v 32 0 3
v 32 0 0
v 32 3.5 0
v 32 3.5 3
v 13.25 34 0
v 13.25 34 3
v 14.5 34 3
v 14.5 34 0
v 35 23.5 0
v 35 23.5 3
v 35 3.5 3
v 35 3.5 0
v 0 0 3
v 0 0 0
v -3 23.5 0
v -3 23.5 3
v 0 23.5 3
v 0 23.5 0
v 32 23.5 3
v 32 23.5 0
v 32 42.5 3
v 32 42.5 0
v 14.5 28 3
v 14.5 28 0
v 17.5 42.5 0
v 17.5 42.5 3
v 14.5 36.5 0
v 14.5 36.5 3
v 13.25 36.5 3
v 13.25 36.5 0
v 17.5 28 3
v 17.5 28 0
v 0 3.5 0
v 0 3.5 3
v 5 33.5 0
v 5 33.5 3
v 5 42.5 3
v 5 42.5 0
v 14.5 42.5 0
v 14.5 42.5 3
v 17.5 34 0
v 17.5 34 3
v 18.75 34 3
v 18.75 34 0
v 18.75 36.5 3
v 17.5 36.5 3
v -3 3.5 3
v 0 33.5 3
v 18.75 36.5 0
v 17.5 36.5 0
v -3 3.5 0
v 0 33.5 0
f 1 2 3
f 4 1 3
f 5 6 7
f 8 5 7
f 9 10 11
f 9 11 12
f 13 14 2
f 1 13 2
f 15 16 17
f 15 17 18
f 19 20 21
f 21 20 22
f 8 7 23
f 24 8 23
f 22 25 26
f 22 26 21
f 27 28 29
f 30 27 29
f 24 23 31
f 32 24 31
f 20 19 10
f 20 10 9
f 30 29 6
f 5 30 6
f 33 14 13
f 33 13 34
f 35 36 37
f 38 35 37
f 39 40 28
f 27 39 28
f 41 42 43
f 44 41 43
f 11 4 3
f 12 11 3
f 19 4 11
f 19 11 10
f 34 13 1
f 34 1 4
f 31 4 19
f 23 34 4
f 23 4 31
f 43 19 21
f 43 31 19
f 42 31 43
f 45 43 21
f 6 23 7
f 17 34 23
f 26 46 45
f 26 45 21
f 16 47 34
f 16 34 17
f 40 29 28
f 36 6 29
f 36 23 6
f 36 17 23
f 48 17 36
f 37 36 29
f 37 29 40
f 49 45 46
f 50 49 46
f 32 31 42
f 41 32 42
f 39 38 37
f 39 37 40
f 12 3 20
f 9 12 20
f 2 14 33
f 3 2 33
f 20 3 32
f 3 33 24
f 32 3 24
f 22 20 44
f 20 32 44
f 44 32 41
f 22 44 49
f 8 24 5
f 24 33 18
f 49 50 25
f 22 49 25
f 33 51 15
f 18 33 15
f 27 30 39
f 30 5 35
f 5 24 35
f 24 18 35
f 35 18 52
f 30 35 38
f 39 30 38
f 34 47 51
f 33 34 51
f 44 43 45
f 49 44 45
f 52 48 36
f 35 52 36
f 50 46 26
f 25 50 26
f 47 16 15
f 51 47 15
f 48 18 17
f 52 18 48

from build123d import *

# Parameters (mm, degrees)
SKETCH_1_W           = 32
SKETCH_1_H           = 42.5
EXTRUDE_1_DEPTH      = 3
EXTRUDE_2_DEPTH      = 3
EXTRUDE_2_DEPTH_BACK = 35
SKETCH_2_W           = 3
SKETCH_2_H           = 20
CUT_EXTRUDE_1_DEPTH  = 3
SKETCH_4_W           = 5
SKETCH_4_H           = 9
CUT_EXTRUDE_2_DEPTH  = 3


with BuildPart() as part:
    # Sketch 1 → Extrude 1 (new body)
    with BuildSketch(Plane.XY):
        with Locations((16, 21.25)):
            Rectangle(SKETCH_1_W, SKETCH_1_H)
    extrude(amount=EXTRUDE_1_DEPTH)

    # Sketch 2 → Extrude 2 (add, two sides: drawn at the far end of the back side and taken through both)
    with BuildSketch(Plane(origin=(32, 0, 0), x_dir=(0, 0, -1), z_dir=(1, 0, 0)).offset(-EXTRUDE_2_DEPTH_BACK)):
        with Locations((-1.5, 13.5)):
            Rectangle(SKETCH_2_W, SKETCH_2_H)
    extrude(amount=EXTRUDE_2_DEPTH + EXTRUDE_2_DEPTH_BACK)

    # Sketch 3 → Cut-Extrude 1 (cut)
    with BuildSketch(Plane.XY.offset(3)):
        Polygon((14.5, 42.5), (14.5, 36.5), (13.25, 36.5), (13.25, 34), (14.5, 34), (14.5, 28), (17.5, 28), (17.5, 34), (18.75, 34), (18.75, 36.5), (17.5, 36.5), (17.5, 42.5), align=None)
    extrude(amount=-CUT_EXTRUDE_1_DEPTH, mode=Mode.SUBTRACT)

    # Sketch 4 → Cut-Extrude 2 (cut)
    with BuildSketch(Plane.XY.offset(3)):
        with Locations((2.5, 38)):
            Rectangle(SKETCH_4_W, SKETCH_4_H)
    extrude(amount=-CUT_EXTRUDE_2_DEPTH, mode=Mode.SUBTRACT)


solid = part.part
